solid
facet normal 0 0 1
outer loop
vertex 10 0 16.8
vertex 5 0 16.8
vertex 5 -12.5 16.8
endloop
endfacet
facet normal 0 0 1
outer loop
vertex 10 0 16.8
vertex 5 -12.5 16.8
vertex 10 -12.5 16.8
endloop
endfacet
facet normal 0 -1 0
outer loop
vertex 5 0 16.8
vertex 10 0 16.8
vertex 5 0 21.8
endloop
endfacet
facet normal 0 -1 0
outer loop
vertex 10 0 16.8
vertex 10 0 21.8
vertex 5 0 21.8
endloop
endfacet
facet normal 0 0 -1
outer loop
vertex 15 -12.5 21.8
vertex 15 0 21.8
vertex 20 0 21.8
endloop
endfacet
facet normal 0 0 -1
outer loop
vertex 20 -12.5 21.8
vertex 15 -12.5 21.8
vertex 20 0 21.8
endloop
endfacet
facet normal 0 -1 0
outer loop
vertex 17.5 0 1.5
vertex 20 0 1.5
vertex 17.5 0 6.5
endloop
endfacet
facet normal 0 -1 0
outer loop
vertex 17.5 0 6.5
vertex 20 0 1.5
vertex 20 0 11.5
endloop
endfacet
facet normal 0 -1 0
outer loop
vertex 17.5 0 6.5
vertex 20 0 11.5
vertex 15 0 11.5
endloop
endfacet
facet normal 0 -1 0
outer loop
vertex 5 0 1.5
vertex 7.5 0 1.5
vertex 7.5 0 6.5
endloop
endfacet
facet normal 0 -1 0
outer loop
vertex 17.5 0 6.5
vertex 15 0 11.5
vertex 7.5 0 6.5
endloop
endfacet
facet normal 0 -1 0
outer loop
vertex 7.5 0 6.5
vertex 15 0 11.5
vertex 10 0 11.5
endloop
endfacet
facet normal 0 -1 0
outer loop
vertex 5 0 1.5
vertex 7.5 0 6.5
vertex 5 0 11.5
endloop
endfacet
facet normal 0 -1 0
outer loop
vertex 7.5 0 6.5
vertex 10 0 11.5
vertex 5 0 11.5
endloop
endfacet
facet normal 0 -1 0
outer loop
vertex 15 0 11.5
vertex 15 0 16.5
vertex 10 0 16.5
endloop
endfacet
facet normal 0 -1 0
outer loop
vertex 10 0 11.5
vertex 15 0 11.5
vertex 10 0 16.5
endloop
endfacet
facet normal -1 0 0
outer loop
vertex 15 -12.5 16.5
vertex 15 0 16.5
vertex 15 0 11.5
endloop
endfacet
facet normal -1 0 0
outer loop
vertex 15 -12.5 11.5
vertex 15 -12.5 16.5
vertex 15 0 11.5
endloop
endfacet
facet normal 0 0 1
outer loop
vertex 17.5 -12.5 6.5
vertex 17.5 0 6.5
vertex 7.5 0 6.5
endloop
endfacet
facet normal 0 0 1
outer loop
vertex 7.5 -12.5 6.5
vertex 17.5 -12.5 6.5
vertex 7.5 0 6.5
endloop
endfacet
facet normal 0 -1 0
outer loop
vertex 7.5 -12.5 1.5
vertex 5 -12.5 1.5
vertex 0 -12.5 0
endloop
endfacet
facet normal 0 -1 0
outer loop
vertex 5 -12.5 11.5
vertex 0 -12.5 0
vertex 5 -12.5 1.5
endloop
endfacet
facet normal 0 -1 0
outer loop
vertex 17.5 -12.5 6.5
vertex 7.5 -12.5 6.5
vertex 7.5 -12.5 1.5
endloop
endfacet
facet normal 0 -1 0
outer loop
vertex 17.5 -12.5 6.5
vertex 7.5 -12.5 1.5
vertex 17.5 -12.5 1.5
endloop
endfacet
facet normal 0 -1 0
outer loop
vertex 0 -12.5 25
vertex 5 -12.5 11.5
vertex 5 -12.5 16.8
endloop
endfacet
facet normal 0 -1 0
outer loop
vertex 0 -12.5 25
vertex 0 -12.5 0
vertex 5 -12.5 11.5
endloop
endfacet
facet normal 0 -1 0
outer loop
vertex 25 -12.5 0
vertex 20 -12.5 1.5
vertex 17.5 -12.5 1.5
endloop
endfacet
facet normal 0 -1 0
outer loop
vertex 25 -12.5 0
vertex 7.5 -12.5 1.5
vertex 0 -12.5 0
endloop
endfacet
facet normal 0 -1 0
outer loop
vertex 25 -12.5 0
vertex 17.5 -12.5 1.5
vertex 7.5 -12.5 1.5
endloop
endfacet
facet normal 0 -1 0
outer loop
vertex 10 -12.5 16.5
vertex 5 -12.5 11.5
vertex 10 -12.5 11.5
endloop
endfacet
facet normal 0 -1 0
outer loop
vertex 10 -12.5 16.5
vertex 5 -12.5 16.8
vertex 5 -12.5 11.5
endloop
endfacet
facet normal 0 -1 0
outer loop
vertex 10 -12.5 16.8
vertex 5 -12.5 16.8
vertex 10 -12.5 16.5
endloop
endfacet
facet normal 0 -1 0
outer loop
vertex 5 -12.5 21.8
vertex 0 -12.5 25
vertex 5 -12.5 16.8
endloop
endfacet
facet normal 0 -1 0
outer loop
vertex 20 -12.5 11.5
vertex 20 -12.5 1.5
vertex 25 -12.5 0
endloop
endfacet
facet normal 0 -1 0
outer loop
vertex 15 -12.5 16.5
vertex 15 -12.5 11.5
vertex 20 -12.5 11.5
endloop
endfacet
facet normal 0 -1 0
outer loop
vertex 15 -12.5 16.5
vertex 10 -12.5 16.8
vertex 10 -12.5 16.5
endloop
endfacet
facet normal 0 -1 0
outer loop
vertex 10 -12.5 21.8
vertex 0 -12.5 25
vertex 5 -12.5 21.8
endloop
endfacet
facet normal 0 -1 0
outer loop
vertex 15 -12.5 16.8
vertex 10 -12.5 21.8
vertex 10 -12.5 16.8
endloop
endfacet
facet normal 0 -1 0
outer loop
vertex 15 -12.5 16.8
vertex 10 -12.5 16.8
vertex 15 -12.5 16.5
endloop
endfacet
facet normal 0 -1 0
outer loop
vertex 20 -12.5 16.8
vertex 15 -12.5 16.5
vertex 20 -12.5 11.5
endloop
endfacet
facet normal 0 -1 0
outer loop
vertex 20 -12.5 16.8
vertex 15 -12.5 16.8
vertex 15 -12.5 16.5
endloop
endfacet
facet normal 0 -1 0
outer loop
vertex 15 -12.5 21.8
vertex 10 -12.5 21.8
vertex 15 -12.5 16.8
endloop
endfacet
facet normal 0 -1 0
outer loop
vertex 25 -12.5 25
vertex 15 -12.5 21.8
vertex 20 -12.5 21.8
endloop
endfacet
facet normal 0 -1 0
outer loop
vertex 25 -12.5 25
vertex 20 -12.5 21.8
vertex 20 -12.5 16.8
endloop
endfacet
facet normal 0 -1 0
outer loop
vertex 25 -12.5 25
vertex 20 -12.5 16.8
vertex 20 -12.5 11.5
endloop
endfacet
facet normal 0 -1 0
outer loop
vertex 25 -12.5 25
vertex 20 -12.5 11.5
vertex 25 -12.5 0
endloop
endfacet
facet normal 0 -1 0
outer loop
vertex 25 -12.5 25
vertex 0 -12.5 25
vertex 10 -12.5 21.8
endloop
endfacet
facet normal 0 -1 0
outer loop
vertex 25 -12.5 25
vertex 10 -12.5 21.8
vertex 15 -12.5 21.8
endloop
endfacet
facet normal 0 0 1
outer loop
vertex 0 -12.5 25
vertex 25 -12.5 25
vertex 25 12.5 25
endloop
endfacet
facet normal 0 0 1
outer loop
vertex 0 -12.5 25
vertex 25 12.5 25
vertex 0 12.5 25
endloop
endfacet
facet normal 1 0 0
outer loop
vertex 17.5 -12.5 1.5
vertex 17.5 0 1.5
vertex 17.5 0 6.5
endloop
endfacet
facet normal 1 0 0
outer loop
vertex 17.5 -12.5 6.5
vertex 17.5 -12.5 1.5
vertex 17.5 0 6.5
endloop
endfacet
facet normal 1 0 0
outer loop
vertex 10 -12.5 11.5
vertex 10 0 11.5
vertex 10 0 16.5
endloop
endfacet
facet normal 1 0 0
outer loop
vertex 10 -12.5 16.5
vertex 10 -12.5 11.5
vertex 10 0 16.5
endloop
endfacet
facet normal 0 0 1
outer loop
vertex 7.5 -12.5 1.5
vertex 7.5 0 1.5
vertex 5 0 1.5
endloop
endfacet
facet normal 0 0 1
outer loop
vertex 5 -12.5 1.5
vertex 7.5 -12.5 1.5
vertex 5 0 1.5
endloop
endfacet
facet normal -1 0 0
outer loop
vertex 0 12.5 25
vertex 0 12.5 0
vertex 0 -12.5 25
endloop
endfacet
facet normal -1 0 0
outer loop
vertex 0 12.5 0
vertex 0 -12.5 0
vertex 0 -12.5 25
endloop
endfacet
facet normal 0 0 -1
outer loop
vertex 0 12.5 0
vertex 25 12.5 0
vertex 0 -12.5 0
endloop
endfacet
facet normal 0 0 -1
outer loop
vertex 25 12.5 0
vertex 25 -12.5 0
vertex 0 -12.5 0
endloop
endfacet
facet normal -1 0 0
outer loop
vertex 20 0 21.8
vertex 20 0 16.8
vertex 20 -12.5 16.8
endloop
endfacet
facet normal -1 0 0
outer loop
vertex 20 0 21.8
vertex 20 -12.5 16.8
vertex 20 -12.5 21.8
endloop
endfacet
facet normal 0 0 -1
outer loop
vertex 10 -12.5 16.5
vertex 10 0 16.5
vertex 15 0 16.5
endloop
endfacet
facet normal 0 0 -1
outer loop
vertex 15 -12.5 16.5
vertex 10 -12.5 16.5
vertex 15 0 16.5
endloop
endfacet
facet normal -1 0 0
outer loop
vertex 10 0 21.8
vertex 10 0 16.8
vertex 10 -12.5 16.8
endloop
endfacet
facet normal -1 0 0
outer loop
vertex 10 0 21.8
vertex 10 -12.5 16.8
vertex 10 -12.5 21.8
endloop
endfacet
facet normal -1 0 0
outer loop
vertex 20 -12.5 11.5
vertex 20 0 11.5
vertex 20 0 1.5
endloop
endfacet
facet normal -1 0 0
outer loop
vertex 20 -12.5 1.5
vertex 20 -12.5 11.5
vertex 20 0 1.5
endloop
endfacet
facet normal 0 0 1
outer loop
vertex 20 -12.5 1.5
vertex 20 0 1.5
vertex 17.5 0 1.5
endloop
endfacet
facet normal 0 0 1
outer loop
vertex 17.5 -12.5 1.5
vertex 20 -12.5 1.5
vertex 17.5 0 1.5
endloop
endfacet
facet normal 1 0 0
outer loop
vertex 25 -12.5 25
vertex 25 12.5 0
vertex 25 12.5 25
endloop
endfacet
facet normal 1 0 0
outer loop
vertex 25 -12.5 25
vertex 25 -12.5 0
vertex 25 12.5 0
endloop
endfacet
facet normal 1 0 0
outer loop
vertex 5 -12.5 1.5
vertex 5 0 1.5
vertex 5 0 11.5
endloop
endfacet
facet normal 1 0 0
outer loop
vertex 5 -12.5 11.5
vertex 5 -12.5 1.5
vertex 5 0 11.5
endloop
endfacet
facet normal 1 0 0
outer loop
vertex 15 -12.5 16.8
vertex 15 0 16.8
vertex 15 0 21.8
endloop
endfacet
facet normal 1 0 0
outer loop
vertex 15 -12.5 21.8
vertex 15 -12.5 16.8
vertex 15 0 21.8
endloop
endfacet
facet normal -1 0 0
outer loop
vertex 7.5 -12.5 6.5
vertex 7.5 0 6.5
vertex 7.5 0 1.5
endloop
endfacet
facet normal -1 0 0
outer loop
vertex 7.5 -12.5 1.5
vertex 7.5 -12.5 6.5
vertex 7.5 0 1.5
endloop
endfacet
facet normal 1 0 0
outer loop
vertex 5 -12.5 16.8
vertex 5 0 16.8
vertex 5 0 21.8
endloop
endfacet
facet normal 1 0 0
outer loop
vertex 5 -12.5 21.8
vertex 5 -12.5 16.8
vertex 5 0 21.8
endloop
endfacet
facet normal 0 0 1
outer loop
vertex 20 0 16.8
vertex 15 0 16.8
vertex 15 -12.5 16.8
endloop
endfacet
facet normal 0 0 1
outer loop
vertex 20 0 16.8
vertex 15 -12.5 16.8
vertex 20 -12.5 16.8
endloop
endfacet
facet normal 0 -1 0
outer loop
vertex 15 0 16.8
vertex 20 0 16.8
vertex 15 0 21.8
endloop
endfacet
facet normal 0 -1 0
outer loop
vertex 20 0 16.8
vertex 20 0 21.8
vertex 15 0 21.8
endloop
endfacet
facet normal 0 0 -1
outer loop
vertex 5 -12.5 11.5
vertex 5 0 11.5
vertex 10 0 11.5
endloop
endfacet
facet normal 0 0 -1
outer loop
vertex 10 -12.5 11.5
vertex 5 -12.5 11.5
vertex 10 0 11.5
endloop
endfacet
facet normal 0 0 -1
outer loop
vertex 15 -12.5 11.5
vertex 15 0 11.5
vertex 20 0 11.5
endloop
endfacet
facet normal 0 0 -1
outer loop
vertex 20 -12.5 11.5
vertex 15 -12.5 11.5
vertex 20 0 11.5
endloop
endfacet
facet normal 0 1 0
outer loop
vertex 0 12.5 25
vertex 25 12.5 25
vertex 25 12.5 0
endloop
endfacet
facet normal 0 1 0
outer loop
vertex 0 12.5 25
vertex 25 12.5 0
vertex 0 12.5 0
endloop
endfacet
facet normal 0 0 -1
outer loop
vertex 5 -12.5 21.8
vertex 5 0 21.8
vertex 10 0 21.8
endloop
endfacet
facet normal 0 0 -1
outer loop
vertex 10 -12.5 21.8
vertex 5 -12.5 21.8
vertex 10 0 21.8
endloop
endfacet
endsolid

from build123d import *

# Parameters (mm, degrees)
F0_W     = 25
F0_H     = 25
F0_W_2   = 5
F0_H_2   = 5
F1_DEPTH = 12.5
F2_W     = 25
F2_H     = 25
F3_DEPTH = 12.5


with BuildPart() as f1:
    # F0 (on Front) → F1 (new body)
    with BuildSketch(Plane.XZ):
        with Locations((12.5, 12.5)):
            Rectangle(F0_W, F0_H)
        Polygon((10, 16.5), (15, 16.5), (15, 11.5), (20, 11.5), (20, 6.5), (20, 1.5), (17.5, 1.5), (17.5, 6.5), (7.5, 6.5), (7.5, 1.5), (5, 1.5), (5, 6.5), (5, 11.5), (10, 11.5), align=None, mode=Mode.SUBTRACT)
        with Locations((7.5, 19.3)):
            Rectangle(F0_W_2, F0_H_2, mode=Mode.SUBTRACT)
        with Locations((17.5, 19.3)):
            Rectangle(F0_W_2, F0_H_2, mode=Mode.SUBTRACT)
    extrude(amount=F1_DEPTH)

    # F2 (on face) → F3 (join)
    with BuildSketch(Plane(origin=(0, 0, 0), x_dir=(-1, 0, 0), z_dir=(0, 1, 0))):
        with Locations((-12.5, 12.5)):
            Rectangle(F2_W, F2_H)
    extrude(amount=F3_DEPTH)


solid = f1.part
